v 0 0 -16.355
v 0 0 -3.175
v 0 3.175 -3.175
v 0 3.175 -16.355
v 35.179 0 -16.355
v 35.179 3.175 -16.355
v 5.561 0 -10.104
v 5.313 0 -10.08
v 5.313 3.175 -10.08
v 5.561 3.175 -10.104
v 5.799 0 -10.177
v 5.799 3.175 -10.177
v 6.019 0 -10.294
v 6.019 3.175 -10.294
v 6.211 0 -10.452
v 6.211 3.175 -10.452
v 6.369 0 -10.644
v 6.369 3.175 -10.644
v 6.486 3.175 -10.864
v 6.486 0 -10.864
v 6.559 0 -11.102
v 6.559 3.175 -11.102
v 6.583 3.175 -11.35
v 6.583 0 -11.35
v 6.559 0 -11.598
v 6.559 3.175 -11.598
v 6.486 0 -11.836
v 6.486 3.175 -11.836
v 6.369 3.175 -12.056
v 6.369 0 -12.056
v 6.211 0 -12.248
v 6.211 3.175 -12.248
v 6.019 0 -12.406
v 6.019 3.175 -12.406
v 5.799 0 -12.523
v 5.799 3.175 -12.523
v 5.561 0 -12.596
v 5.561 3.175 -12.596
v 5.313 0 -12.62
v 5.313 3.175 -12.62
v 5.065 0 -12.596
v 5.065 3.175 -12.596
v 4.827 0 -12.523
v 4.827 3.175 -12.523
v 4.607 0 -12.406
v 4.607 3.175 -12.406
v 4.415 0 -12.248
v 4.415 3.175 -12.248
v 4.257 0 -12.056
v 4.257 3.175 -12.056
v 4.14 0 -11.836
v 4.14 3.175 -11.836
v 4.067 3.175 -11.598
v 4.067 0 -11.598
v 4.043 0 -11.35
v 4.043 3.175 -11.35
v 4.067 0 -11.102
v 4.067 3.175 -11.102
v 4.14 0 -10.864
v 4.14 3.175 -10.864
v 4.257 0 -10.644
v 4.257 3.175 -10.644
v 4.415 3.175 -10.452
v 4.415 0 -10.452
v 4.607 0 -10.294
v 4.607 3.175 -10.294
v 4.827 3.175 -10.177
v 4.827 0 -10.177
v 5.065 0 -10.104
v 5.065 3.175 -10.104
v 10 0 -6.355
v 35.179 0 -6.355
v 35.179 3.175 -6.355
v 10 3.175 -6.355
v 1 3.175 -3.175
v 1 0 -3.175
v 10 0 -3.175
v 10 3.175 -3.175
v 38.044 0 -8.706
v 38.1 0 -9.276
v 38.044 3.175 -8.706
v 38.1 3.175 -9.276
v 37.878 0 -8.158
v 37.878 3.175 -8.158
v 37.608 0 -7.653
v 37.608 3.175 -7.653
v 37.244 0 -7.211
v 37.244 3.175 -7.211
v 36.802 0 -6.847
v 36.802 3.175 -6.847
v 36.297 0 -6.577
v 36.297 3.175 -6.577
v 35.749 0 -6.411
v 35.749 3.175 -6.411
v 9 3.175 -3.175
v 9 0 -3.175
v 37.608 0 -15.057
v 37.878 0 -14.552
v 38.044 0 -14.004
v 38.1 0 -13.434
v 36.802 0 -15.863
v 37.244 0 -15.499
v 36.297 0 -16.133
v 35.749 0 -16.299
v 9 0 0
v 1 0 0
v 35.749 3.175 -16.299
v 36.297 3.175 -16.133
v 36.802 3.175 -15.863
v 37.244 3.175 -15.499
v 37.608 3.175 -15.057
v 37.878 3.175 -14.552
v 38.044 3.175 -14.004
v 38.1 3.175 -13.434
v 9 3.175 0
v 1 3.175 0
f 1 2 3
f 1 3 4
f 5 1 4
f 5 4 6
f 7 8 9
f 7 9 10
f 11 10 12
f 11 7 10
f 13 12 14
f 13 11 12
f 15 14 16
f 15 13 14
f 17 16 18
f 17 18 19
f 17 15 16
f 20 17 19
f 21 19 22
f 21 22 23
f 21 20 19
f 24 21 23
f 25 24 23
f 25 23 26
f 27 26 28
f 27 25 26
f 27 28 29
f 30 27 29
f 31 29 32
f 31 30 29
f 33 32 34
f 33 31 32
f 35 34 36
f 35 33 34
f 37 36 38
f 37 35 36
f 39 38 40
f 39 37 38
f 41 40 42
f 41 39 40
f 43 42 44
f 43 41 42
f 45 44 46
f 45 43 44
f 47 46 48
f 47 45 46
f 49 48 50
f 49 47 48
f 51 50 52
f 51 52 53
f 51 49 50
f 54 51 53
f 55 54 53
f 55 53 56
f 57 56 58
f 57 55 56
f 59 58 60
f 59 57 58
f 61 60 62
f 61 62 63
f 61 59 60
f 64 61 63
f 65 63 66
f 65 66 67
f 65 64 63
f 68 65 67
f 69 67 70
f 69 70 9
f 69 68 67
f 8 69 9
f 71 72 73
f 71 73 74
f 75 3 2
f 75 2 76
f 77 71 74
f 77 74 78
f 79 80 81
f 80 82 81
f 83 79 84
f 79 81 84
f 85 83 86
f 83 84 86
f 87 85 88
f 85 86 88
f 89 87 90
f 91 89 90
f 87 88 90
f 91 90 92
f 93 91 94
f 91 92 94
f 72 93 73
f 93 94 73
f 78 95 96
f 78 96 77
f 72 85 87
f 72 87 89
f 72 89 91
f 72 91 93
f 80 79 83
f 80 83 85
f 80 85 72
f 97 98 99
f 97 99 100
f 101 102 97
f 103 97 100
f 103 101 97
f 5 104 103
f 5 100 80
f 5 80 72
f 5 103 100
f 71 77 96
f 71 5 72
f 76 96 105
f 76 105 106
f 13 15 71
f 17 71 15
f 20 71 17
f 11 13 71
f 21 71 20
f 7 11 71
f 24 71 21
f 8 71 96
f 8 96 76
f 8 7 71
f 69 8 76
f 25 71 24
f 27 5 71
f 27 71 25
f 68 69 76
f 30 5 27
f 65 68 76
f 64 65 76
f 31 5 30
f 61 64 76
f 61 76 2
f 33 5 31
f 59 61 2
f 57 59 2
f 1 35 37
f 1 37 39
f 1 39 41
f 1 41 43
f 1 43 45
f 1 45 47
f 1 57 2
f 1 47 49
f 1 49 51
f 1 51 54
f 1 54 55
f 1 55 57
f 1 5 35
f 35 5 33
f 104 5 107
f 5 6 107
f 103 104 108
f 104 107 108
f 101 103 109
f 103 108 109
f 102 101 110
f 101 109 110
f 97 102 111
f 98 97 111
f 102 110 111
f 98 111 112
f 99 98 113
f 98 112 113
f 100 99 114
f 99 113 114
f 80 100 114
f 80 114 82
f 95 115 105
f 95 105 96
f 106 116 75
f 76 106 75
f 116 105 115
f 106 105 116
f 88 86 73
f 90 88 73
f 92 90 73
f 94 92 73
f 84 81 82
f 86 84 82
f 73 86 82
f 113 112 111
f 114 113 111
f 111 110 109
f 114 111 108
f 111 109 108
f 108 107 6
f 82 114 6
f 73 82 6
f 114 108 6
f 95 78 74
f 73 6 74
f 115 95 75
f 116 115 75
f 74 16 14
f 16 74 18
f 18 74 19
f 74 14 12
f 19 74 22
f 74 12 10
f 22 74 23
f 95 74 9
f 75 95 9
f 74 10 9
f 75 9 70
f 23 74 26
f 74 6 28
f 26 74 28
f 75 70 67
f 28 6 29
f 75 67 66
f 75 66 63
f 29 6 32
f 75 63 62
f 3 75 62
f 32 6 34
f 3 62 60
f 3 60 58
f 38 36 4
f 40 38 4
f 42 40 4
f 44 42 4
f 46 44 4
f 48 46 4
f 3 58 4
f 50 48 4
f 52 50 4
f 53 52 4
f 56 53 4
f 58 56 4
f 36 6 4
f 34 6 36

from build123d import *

# Parameters (mm, degrees)
SKETCH1_R           = 1.27
BOSS_EXTRUDE1_DEPTH = 3.175
FILLET1_R           = 2.921
SKETCH2_W           = 1
SKETCH2_H           = 3.175
CUT_EXTRUDE1_DEPTH  = 42.583369873


with BuildPart() as part:
    # Sketch1 → Boss-Extrude1 (new body)
    with BuildSketch(Plane(origin=(0, 0, 0), x_dir=(1, 0, 0), z_dir=(0, 1, 0))):
        Polygon((0, 0), (0, 16.355), (38.1, 16.355), (38.1, 6.355), (10, 6.355), (10, 0), align=None)
        with Locations(Location((5.313, 11.35, 0), (0, 0, 270))):
            Circle(SKETCH1_R, mode=Mode.SUBTRACT)
    extrude(amount=BOSS_EXTRUDE1_DEPTH)

    # Fillet1
    fillet1_edges = [part.edges().sort_by_distance(p)[0] for p in [
        (38.1, 1.5875, -16.355),
        (38.1, 1.5875, -6.355),
    ]]
    fillet(fillet1_edges, radius=FILLET1_R)

    # Sketch2 → Cut-Extrude1 (cut, through all)
    with BuildSketch(Plane(origin=(0, 3.175, 0), x_dir=(1, 0, 0), z_dir=(0, 1, 0))):
        with Locations((9.5, 1.5875)):
            Rectangle(SKETCH2_W, SKETCH2_H)
        with Locations((0.5, 1.5875)):
            Rectangle(SKETCH2_W, SKETCH2_H)
    extrude(amount=-CUT_EXTRUDE1_DEPTH, mode=Mode.SUBTRACT)


solid = part.part
